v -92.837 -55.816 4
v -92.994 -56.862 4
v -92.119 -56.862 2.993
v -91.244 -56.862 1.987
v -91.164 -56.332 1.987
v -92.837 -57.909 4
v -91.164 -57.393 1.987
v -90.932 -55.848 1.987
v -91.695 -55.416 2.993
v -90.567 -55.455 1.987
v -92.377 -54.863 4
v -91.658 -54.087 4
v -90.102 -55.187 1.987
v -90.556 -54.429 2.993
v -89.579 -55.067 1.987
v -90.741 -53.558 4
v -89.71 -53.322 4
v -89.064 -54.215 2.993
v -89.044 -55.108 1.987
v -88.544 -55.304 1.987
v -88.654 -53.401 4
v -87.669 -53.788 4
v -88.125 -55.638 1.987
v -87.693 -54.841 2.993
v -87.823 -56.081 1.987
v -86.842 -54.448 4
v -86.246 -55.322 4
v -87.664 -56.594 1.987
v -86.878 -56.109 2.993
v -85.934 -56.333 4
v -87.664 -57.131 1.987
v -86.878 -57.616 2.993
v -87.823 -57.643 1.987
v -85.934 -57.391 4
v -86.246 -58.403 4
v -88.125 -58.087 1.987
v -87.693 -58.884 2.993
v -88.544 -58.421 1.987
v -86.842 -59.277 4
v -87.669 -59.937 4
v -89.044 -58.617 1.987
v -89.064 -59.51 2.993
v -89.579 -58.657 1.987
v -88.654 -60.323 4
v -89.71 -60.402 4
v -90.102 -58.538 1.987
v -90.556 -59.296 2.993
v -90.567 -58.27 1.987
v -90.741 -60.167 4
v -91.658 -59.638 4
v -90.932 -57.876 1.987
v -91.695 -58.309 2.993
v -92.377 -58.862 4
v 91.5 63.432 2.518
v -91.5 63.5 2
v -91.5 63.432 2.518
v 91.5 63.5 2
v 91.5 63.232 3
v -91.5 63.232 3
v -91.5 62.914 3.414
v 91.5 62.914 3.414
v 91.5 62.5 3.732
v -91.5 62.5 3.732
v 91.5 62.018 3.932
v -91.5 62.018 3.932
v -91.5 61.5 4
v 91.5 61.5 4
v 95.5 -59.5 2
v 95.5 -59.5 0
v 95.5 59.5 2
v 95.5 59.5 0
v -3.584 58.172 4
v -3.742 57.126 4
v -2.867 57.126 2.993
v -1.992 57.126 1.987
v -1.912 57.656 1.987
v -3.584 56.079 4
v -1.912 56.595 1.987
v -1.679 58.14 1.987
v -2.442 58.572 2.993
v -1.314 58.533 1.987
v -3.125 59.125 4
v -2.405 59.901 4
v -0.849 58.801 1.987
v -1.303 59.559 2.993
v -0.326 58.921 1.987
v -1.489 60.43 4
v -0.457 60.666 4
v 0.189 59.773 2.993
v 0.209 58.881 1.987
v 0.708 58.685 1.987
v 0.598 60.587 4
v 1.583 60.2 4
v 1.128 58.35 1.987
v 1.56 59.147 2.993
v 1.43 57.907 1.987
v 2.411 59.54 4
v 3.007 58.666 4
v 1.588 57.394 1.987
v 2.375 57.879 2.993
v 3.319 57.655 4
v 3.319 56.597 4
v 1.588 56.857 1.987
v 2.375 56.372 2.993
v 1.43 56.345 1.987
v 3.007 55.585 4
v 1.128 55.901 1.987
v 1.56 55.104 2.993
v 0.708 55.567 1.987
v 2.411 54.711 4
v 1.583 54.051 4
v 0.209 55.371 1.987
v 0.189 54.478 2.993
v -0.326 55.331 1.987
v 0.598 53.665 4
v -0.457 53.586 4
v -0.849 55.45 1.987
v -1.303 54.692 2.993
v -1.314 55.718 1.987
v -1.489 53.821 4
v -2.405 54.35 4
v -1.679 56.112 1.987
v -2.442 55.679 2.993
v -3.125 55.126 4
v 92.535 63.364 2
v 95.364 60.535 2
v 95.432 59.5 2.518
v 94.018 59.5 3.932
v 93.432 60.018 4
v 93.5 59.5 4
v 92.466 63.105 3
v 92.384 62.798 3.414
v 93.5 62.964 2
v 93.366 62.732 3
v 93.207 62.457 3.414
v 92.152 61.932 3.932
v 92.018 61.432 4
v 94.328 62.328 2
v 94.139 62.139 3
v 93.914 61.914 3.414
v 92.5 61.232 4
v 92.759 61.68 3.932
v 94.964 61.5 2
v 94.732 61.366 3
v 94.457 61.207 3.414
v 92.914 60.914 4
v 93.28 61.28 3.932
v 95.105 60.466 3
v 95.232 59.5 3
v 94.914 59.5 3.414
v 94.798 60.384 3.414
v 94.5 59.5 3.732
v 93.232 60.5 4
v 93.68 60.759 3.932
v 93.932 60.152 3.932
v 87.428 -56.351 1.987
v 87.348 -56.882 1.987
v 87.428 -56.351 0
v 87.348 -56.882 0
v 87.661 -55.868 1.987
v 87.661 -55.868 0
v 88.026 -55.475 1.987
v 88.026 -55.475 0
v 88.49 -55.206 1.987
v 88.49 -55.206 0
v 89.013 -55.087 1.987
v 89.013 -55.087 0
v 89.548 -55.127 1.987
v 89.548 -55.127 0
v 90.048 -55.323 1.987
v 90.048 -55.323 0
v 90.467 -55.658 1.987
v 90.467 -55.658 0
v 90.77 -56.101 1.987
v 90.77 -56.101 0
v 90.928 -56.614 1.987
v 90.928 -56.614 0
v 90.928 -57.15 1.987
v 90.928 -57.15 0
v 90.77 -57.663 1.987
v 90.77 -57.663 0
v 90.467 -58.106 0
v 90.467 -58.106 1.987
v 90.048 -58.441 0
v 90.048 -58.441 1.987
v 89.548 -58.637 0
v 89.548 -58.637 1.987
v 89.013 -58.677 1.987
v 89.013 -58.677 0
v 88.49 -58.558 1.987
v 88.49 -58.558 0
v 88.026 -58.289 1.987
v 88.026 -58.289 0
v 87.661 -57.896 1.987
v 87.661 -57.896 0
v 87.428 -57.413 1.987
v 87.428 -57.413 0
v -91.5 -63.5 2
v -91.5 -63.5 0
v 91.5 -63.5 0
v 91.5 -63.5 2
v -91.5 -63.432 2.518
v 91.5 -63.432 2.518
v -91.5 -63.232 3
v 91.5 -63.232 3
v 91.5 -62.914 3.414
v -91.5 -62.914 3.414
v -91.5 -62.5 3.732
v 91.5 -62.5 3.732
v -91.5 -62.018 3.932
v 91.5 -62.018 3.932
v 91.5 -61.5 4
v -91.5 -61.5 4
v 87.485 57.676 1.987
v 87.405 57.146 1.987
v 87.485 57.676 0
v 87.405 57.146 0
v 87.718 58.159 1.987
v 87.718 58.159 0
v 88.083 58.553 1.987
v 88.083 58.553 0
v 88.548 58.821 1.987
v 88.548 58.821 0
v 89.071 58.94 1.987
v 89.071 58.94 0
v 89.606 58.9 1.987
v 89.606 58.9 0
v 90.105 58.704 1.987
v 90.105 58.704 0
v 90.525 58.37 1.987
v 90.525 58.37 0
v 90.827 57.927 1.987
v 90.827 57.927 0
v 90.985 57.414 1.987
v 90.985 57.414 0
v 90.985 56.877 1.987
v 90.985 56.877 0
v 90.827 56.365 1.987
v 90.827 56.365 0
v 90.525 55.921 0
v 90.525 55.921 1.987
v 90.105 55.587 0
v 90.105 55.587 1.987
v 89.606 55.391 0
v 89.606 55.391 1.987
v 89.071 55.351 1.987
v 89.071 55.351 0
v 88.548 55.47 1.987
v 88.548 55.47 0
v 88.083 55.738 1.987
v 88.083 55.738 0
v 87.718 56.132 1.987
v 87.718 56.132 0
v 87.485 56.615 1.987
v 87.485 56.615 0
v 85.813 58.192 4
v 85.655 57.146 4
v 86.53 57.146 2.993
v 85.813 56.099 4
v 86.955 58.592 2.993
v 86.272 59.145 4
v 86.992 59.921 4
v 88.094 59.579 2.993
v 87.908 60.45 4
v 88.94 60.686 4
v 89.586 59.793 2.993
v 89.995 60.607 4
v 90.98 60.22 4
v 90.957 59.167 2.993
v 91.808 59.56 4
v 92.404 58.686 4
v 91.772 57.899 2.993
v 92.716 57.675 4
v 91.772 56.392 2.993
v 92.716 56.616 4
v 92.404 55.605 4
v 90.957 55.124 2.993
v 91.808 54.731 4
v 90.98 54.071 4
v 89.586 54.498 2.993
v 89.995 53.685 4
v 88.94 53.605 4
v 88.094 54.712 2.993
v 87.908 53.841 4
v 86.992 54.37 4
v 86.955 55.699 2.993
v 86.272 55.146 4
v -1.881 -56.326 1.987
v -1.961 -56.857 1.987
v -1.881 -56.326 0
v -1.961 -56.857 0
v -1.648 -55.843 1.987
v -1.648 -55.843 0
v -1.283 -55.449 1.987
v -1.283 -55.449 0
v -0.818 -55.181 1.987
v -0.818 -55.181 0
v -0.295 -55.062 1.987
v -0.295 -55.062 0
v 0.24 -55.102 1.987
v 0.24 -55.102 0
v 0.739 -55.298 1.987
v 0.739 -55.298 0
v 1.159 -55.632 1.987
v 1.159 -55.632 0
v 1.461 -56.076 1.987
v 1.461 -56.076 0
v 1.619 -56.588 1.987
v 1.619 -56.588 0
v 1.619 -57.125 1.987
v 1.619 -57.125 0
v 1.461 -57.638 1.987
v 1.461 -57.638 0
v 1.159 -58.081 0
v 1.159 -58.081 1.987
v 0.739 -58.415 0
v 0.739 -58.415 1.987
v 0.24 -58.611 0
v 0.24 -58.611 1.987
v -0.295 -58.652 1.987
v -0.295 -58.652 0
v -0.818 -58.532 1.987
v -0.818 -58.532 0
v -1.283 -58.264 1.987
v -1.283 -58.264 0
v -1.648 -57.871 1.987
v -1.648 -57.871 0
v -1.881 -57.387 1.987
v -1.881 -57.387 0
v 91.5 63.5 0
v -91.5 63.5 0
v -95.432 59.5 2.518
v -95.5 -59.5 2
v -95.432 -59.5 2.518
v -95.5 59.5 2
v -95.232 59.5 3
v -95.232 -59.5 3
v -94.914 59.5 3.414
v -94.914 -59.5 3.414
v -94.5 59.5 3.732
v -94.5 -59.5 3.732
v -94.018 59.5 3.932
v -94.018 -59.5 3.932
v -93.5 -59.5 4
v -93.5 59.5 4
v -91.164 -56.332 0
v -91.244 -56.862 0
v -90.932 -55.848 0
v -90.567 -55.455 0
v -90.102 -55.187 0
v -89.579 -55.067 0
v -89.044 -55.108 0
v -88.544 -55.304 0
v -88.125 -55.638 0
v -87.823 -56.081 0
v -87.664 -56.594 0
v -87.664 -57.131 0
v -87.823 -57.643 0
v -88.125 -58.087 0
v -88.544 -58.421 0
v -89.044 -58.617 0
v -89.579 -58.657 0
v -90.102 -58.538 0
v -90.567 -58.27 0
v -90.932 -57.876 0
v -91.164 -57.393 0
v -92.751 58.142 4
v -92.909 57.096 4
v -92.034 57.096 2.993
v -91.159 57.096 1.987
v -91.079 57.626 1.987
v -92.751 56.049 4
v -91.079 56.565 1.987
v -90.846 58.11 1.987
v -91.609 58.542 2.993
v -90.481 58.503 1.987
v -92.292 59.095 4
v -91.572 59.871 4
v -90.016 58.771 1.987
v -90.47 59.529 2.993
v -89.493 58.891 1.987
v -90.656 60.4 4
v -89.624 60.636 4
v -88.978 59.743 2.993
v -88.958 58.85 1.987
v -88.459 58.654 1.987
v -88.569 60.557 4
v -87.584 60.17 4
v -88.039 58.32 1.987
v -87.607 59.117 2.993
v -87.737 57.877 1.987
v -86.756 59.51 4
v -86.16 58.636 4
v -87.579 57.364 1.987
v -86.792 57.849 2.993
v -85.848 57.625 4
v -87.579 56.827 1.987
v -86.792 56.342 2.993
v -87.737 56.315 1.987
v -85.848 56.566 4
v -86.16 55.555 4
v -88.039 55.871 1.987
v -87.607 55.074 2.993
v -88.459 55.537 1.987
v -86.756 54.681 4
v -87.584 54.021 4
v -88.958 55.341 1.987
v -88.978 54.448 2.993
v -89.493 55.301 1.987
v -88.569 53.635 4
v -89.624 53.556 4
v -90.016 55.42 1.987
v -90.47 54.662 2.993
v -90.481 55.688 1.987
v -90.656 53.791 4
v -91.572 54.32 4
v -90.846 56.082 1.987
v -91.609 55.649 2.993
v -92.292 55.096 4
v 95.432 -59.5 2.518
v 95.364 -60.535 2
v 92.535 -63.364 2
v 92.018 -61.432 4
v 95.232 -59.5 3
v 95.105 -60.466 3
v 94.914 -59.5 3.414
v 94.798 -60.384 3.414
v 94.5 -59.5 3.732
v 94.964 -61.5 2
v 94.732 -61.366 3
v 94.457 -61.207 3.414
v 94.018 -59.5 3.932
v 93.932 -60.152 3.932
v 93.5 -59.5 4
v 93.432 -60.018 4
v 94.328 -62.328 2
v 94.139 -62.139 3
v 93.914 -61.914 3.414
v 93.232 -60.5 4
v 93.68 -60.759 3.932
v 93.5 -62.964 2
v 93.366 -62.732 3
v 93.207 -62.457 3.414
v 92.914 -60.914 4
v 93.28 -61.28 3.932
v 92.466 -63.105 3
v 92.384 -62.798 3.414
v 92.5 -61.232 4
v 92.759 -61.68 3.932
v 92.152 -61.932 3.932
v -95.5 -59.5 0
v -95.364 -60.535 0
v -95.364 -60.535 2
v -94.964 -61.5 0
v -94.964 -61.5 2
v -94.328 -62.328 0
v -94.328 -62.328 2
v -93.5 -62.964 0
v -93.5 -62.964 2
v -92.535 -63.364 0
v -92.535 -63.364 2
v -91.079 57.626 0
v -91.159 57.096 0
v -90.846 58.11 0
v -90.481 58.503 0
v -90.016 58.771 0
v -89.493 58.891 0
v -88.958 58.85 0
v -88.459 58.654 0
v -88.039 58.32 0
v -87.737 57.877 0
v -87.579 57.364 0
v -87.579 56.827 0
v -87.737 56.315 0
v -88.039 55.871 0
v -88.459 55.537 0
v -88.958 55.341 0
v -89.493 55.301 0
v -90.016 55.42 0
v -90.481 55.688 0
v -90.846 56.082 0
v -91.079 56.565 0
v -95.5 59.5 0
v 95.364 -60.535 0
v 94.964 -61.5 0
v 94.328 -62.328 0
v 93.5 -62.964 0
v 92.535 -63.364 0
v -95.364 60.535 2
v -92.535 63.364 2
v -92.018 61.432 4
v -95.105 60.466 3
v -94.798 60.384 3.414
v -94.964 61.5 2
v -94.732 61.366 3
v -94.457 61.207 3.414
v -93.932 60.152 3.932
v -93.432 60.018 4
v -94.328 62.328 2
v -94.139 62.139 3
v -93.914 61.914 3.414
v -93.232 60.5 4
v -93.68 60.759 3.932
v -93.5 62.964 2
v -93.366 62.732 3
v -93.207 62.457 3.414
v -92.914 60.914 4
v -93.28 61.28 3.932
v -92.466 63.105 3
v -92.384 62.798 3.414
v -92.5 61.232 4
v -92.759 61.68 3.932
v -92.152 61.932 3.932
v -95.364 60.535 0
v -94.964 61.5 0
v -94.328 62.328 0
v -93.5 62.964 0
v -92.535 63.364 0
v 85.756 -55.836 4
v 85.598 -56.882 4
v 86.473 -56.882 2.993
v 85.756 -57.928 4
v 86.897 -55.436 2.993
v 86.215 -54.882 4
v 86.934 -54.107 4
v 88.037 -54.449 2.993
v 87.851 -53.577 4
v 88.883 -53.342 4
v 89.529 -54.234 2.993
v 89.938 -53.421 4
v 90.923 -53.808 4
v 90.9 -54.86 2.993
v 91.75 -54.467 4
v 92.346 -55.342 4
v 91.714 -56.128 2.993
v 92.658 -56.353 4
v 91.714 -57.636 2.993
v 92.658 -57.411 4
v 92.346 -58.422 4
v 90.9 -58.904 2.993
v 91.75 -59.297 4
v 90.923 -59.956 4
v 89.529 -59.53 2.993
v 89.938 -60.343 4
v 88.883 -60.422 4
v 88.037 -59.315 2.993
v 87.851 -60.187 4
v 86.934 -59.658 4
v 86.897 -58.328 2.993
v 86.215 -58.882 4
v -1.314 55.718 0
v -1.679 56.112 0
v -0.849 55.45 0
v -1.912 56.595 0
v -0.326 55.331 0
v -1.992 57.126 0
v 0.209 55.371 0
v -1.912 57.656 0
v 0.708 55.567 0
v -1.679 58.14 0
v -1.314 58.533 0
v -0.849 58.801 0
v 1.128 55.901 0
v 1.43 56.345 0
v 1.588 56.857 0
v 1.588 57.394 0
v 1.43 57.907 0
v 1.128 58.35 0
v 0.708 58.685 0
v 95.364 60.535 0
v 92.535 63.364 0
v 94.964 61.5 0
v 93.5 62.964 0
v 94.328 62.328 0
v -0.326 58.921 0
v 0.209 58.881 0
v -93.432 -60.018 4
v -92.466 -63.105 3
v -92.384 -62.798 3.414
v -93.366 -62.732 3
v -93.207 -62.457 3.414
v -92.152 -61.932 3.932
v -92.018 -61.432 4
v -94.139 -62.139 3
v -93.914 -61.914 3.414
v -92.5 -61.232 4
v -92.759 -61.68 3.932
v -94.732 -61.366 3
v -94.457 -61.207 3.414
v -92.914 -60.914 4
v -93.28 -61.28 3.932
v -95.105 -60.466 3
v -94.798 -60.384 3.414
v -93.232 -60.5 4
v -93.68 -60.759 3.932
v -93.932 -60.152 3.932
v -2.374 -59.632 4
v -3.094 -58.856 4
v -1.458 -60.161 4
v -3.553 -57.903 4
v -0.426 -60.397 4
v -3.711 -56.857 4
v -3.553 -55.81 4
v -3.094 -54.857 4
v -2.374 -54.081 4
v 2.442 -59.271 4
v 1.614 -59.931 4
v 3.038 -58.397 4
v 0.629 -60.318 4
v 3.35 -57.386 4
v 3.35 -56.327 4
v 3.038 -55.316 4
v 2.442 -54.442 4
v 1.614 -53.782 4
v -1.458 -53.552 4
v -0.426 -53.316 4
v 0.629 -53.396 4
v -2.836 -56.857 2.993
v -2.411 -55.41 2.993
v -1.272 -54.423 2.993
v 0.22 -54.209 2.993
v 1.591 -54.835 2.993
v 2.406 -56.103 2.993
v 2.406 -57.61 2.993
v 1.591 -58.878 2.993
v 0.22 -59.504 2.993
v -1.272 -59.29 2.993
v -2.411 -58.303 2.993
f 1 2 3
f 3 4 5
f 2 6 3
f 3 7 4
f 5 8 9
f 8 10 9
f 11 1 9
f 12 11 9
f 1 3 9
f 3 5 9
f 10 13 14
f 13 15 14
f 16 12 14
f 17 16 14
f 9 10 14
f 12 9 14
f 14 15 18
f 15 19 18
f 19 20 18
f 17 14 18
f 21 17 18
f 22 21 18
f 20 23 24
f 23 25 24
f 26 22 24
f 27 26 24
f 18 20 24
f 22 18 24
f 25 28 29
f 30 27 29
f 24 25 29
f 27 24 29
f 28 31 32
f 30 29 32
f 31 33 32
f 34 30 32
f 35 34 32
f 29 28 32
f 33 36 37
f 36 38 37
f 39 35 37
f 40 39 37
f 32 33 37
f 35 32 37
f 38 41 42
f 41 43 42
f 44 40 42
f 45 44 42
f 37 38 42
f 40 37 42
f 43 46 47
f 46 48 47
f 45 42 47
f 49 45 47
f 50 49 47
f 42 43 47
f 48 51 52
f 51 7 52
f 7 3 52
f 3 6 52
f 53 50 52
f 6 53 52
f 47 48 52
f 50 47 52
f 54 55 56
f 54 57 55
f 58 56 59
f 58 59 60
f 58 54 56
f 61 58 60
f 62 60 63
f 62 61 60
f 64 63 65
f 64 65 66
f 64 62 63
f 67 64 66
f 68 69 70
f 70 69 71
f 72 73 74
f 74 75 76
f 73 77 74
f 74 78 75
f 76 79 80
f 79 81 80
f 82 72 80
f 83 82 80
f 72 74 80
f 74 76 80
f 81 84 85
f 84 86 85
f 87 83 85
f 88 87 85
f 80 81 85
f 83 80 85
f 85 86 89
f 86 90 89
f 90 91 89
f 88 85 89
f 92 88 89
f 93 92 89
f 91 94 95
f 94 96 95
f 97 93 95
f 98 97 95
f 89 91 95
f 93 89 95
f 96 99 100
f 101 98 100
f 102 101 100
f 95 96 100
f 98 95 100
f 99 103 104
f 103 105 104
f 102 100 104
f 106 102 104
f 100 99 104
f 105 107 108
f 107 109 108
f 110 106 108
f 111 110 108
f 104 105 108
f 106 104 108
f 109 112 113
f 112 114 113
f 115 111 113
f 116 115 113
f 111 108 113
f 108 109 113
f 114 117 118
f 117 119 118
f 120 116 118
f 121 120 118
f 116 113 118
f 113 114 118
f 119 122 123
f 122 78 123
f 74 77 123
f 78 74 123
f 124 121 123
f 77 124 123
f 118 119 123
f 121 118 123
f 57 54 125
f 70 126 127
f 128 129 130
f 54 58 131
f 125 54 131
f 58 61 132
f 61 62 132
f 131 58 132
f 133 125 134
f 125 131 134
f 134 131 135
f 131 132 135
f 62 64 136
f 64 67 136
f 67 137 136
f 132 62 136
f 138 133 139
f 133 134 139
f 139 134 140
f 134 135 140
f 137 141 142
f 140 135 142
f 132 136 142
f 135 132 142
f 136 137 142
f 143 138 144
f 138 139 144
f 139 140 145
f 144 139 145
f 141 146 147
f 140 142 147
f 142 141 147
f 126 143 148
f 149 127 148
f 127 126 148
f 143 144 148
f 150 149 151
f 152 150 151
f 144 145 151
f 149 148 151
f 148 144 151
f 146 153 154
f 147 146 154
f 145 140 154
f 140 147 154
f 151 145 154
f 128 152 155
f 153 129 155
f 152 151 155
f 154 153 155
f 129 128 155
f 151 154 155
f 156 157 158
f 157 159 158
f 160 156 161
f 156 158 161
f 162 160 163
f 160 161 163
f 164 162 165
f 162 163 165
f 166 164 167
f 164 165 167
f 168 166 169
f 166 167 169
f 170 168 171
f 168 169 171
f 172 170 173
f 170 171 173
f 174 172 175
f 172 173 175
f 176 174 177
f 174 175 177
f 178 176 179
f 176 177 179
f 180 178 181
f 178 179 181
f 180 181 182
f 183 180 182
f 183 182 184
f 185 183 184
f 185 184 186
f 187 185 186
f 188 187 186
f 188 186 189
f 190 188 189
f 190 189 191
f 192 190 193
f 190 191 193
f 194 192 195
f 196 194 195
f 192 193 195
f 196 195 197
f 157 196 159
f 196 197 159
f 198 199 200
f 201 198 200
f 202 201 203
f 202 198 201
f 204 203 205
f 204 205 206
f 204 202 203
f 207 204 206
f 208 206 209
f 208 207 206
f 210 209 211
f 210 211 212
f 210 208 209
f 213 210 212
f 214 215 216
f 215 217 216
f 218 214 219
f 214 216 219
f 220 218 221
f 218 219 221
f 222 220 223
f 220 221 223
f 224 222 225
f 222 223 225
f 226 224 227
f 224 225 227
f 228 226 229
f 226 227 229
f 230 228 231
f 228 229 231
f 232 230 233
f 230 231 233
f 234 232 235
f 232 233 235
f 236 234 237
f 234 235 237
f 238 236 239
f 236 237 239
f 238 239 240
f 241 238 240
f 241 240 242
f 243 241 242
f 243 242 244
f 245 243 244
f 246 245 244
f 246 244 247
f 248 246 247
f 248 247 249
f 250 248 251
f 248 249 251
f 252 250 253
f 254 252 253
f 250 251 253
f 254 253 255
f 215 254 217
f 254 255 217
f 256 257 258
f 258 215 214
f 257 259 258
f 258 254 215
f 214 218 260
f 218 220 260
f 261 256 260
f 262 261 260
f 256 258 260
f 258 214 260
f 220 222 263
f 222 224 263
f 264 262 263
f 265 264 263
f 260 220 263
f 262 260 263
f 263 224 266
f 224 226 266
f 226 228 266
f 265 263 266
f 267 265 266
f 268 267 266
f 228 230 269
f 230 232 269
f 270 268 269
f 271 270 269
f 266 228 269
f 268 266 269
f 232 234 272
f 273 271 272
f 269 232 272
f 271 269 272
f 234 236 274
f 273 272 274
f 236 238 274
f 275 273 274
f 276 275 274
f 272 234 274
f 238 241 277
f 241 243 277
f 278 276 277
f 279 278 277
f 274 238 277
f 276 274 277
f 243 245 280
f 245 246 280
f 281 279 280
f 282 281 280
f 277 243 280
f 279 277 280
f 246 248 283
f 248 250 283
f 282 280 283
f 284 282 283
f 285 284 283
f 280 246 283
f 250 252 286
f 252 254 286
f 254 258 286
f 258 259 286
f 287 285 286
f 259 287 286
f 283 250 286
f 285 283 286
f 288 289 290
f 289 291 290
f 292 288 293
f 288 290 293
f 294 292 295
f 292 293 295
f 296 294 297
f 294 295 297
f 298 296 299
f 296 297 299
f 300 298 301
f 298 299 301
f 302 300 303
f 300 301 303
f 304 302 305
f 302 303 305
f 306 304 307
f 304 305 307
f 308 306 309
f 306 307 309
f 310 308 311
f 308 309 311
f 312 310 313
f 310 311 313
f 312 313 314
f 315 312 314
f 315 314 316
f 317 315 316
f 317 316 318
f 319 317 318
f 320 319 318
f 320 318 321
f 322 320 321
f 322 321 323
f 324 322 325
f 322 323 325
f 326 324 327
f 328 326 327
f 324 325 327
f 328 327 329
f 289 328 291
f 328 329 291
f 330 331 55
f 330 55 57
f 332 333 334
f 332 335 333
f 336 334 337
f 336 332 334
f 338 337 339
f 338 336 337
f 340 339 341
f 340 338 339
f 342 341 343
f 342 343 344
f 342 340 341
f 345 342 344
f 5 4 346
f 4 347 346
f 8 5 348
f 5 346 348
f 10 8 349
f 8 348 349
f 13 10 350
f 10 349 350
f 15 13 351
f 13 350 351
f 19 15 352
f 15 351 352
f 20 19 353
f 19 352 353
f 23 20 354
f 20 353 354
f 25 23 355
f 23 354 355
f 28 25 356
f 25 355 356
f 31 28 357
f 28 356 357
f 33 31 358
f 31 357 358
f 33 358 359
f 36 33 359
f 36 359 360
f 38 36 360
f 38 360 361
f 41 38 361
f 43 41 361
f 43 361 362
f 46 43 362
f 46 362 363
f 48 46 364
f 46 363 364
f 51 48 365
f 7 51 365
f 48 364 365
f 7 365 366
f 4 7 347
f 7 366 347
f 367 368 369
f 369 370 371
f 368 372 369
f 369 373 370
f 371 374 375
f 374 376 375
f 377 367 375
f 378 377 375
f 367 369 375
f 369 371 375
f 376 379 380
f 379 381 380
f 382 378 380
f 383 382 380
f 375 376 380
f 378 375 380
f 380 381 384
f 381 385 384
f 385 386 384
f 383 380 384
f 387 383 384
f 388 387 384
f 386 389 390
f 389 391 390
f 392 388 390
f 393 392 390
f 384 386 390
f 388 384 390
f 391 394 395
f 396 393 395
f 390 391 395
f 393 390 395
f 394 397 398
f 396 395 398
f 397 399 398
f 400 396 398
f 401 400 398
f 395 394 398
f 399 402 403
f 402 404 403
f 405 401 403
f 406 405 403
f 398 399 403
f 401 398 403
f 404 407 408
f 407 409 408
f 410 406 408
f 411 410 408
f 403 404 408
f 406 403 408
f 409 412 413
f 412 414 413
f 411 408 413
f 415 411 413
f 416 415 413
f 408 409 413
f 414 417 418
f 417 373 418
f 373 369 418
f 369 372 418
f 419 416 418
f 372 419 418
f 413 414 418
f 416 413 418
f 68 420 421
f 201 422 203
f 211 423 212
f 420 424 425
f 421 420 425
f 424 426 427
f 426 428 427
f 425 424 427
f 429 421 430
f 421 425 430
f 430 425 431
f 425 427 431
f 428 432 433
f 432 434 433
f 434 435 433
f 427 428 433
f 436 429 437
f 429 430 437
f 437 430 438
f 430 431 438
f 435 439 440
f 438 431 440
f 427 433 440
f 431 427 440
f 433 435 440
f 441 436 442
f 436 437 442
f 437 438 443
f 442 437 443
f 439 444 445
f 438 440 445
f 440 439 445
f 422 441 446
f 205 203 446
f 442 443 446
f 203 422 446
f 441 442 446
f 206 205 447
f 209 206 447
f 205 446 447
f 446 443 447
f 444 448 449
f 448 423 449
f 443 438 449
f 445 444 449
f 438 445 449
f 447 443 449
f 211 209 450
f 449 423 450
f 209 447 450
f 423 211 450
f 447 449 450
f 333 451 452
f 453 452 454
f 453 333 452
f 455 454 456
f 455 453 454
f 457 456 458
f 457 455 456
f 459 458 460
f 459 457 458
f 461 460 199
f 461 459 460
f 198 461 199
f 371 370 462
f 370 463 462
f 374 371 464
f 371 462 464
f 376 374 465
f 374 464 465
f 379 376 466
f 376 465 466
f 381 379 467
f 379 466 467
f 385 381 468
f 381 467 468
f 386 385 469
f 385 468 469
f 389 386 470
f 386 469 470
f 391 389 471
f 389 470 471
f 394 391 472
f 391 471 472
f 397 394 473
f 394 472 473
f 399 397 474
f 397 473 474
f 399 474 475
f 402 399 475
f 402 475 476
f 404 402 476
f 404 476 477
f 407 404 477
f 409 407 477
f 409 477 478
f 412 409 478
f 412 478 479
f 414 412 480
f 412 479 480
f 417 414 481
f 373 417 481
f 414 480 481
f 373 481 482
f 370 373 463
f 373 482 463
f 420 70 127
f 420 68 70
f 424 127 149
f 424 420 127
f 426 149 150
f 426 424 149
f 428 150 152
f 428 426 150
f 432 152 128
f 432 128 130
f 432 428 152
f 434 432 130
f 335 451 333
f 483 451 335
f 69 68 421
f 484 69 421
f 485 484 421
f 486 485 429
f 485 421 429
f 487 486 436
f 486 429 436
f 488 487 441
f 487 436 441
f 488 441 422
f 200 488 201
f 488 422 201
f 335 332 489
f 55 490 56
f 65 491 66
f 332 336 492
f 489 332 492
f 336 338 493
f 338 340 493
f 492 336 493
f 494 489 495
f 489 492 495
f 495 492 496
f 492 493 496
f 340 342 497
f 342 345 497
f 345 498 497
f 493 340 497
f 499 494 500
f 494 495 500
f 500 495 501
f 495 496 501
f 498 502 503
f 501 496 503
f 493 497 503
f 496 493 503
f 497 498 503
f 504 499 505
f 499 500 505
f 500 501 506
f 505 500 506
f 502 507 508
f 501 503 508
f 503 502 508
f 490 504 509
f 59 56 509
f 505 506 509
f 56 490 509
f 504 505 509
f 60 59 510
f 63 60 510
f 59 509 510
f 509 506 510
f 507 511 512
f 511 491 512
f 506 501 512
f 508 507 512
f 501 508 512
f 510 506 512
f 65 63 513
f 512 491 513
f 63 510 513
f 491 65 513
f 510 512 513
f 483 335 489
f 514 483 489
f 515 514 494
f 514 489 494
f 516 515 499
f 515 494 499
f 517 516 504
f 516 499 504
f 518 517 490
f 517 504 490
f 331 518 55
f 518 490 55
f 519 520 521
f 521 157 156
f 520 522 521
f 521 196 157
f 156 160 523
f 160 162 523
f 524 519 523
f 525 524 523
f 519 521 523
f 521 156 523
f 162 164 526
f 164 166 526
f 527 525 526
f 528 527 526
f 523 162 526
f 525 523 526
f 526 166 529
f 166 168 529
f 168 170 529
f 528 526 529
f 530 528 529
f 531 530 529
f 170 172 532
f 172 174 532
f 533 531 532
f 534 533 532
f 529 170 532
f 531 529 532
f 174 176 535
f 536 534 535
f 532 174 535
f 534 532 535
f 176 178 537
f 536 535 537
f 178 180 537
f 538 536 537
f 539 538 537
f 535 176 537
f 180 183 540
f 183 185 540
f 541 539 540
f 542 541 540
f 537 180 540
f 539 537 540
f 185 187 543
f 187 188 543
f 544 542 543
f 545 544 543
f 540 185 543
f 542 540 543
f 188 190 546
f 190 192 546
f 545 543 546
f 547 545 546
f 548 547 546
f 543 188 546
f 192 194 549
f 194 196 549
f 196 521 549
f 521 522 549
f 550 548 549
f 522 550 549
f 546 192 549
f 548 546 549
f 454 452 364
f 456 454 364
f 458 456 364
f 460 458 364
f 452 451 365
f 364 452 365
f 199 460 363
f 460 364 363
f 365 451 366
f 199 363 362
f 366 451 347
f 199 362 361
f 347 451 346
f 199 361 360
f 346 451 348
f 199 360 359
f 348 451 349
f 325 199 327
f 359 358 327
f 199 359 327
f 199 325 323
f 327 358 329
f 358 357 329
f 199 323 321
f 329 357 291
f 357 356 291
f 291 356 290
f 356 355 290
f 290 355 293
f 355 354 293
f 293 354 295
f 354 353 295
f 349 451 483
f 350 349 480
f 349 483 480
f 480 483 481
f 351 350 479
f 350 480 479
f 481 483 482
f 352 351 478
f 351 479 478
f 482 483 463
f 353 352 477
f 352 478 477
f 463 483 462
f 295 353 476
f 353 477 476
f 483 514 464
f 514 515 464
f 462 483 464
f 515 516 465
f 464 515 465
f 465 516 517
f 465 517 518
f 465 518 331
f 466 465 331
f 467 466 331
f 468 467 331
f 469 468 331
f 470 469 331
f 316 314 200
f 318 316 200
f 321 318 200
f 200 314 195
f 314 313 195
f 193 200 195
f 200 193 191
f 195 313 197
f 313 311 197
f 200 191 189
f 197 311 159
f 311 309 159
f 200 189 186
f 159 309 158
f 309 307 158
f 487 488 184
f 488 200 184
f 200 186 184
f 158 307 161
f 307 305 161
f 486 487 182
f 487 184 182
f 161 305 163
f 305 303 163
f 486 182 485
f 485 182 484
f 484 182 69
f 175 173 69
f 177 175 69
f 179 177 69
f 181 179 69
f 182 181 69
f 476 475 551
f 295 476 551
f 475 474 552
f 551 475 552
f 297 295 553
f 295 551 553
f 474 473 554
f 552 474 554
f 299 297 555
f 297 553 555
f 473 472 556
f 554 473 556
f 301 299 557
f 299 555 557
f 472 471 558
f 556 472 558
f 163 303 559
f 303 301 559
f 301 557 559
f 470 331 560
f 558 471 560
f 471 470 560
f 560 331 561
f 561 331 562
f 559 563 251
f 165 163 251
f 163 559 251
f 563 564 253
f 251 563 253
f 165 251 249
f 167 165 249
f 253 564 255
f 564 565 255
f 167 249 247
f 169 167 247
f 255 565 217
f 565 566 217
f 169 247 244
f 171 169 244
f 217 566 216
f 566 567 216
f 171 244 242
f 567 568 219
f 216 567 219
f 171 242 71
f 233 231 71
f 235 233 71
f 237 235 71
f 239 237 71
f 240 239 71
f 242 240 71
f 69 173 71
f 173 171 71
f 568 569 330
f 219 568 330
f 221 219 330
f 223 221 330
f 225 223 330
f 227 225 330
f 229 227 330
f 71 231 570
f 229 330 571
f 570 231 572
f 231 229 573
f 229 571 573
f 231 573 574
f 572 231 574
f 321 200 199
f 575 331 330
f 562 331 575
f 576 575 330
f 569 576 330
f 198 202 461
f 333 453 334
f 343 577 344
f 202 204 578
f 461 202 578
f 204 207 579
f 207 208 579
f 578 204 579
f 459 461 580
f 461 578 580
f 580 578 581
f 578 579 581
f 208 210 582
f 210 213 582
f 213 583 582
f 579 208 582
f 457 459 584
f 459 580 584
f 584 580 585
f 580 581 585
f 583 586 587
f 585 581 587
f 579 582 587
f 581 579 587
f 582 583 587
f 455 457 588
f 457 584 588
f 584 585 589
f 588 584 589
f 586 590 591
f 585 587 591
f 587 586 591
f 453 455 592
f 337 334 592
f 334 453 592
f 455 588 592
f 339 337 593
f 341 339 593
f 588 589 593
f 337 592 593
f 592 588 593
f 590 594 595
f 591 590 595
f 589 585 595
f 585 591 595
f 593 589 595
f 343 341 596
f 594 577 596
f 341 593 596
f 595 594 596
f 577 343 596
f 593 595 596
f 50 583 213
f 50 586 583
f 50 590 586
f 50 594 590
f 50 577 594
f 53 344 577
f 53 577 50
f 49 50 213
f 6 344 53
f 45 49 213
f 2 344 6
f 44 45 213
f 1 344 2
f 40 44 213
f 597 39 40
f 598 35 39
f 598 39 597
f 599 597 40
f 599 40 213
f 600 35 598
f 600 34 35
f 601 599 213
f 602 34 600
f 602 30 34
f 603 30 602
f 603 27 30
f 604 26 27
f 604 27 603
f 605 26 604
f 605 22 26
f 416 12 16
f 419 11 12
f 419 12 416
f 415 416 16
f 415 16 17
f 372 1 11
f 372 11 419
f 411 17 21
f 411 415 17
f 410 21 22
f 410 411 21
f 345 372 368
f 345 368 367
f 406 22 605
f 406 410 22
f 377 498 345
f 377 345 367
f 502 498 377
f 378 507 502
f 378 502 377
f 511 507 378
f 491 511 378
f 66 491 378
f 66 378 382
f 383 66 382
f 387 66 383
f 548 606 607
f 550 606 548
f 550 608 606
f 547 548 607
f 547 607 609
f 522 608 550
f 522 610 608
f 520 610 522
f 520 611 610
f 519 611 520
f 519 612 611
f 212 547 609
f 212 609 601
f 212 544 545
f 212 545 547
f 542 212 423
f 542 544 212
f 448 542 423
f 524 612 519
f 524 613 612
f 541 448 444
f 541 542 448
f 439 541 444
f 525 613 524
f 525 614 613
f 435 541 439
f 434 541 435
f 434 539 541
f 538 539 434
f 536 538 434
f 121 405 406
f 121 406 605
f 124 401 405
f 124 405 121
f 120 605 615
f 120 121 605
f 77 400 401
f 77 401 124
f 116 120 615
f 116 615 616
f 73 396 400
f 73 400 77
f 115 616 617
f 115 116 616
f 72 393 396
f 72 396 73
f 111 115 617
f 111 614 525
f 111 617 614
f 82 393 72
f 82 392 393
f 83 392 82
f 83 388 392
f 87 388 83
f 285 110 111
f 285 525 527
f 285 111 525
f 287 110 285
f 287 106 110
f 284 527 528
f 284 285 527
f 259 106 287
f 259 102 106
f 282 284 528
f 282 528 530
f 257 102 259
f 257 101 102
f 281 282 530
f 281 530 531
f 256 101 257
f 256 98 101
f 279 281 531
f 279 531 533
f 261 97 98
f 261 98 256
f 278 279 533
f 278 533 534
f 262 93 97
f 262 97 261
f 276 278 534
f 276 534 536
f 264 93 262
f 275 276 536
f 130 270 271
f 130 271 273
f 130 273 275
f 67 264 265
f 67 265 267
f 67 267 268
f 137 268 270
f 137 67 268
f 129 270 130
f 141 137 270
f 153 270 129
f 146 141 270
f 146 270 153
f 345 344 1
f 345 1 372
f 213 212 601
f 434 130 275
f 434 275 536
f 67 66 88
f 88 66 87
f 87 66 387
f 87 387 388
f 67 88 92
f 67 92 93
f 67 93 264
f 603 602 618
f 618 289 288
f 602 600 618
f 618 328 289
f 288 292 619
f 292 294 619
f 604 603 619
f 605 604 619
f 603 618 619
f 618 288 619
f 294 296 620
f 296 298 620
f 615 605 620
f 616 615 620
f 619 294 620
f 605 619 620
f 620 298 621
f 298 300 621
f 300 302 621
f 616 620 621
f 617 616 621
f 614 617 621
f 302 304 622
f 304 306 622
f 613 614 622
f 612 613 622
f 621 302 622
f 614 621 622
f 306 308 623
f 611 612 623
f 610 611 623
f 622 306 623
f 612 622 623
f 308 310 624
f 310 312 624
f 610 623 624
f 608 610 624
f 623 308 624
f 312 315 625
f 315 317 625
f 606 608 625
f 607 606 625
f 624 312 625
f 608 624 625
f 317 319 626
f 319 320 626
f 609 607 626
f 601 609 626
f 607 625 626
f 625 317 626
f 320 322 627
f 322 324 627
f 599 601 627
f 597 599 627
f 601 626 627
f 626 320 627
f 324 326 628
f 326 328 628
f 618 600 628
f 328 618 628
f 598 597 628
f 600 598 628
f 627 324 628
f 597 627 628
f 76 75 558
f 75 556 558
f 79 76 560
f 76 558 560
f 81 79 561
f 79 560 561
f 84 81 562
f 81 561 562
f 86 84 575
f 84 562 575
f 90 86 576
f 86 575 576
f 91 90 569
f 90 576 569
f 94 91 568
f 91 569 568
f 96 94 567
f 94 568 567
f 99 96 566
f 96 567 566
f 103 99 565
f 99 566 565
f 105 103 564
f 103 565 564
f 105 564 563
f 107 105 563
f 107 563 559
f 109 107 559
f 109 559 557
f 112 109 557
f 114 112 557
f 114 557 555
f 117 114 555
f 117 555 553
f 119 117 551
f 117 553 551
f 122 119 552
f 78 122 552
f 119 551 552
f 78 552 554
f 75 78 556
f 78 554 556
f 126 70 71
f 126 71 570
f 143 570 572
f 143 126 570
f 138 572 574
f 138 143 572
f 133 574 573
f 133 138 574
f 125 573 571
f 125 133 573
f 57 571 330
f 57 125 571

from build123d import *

# Parameters (mm, degrees)
SKETCH3_W           = 191
SKETCH3_H           = 127
BOSS_EXTRUDE3_DEPTH = 4
SKETCH6_R           = 4
BOSS_EXTRUDE4_DEPTH = 0.001
HOLE1_D             = 3.6
HOLE1_DEPTH         = 5
HOLE1_CSINK_D       = 7.1
HOLE1_CSINK_ANGLE   = 82
FILLET1_R           = 4
FILLET2_R           = 2


with BuildPart() as part:
    # Sketch3 → Boss-Extrude3 (new body)
    with BuildSketch(Plane.XY):
        Rectangle(SKETCH3_W, SKETCH3_H)
    extrude(amount=BOSS_EXTRUDE3_DEPTH)

    # Sketch6 → Boss-Extrude4 (add)
    with BuildSketch(Plane.XY):
        with Locations((-89.294075307, 57.128381867)):
            Circle(SKETCH6_R)
        with Locations((89.301830171, 57.128381867)):
            Circle(SKETCH6_R)
        with Locations((89.301830171, -56.852590264)):
            Circle(SKETCH6_R)
        with Locations((-89.294075307, -56.852590264)):
            Circle(SKETCH6_R)
        with Locations((0, -56.852590264)):
            Circle(SKETCH6_R)
        with Locations((0, 57.128381867)):
            Circle(SKETCH6_R)
    extrude(amount=BOSS_EXTRUDE4_DEPTH)

    # Hole1
    with Locations(Plane(origin=(-89.358562902, 57.095579806, 4), x_dir=(1, 0, 0), z_dir=(0, 0, 1))):
        with Locations((0, 0), (89.166832603, 0.030108388), (178.563780061, 0.049936098), (178.506385813, -113.977594328), (89.197749936, -113.952124174), (-0.085769967, -113.957972021)):
            CounterSinkHole(HOLE1_D / 2, HOLE1_CSINK_D / 2, depth=HOLE1_DEPTH, counter_sink_angle=HOLE1_CSINK_ANGLE)

    # Fillet1
    fillet1_edges = [part.edges().sort_by_distance(p)[0] for p in [
        (95.5, -63.5, 2),
        (-95.5, -63.5, 2),
        (-95.5, 63.5, 2),
        (95.5, 63.5, 2),
    ]]
    fillet(fillet1_edges, radius=FILLET1_R)

    # Fillet2
    fillet2_edges = [part.edges().sort_by_distance(p)[0] for p in [
        (-95.5, 0, 4),
        (0, 63.5, 4),
        (95.5, 0, 4),
        (0, -63.5, 4),
        (94.328427125, -62.328427125, 4),
        (94.328427125, 62.328427125, 4),
        (-94.328427125, -62.328427125, 4),
        (-94.328427125, 62.328427125, 4),
    ]]
    fillet(fillet2_edges, radius=FILLET2_R)


solid = part.part
